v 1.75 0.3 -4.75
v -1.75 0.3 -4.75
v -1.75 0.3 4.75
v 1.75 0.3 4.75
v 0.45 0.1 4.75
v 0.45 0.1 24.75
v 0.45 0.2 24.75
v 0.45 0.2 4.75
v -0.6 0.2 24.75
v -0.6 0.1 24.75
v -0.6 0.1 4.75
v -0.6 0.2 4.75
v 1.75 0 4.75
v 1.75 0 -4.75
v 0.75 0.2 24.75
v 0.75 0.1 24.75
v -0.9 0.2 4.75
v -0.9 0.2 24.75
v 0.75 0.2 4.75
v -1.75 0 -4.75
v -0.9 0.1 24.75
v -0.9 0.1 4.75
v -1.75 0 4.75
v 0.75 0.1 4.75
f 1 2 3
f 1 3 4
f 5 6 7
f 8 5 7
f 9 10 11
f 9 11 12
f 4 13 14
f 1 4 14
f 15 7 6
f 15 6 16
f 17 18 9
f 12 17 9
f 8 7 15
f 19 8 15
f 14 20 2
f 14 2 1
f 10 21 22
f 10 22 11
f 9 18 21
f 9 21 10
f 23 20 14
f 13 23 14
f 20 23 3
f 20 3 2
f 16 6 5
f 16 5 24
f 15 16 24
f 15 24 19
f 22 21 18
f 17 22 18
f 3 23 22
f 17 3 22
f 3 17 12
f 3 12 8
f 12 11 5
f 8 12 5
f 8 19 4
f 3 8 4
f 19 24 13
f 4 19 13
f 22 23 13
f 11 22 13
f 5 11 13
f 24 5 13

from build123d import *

# Parameters (mm, degrees)
SKETCH2_W           = 3.5
SKETCH2_H           = 9.5
BOSS_EXTRUDE1_DEPTH = 0.3
SKETCH3_W           = 0.3
SKETCH3_H           = 0.1
BOSS_EXTRUDE2_DEPTH = 20


with BuildPart() as part:
    # Sketch2 → Boss-Extrude1 (new body)
    with BuildSketch(Plane(origin=(0, 0, 0), x_dir=(1, 0, 0), z_dir=(0, 1, 0))):
        Rectangle(SKETCH2_W, SKETCH2_H)
    extrude(amount=BOSS_EXTRUDE1_DEPTH)

    # Sketch3 → Boss-Extrude2 (add)
    with BuildSketch(Plane.XY.offset(4.75)):
        with Locations((-0.75, 0.15)):
            Rectangle(SKETCH3_W, SKETCH3_H)
        with Locations((0.6, 0.15)):
            Rectangle(SKETCH3_W, SKETCH3_H)
    extrude(amount=BOSS_EXTRUDE2_DEPTH)


solid = part.part
